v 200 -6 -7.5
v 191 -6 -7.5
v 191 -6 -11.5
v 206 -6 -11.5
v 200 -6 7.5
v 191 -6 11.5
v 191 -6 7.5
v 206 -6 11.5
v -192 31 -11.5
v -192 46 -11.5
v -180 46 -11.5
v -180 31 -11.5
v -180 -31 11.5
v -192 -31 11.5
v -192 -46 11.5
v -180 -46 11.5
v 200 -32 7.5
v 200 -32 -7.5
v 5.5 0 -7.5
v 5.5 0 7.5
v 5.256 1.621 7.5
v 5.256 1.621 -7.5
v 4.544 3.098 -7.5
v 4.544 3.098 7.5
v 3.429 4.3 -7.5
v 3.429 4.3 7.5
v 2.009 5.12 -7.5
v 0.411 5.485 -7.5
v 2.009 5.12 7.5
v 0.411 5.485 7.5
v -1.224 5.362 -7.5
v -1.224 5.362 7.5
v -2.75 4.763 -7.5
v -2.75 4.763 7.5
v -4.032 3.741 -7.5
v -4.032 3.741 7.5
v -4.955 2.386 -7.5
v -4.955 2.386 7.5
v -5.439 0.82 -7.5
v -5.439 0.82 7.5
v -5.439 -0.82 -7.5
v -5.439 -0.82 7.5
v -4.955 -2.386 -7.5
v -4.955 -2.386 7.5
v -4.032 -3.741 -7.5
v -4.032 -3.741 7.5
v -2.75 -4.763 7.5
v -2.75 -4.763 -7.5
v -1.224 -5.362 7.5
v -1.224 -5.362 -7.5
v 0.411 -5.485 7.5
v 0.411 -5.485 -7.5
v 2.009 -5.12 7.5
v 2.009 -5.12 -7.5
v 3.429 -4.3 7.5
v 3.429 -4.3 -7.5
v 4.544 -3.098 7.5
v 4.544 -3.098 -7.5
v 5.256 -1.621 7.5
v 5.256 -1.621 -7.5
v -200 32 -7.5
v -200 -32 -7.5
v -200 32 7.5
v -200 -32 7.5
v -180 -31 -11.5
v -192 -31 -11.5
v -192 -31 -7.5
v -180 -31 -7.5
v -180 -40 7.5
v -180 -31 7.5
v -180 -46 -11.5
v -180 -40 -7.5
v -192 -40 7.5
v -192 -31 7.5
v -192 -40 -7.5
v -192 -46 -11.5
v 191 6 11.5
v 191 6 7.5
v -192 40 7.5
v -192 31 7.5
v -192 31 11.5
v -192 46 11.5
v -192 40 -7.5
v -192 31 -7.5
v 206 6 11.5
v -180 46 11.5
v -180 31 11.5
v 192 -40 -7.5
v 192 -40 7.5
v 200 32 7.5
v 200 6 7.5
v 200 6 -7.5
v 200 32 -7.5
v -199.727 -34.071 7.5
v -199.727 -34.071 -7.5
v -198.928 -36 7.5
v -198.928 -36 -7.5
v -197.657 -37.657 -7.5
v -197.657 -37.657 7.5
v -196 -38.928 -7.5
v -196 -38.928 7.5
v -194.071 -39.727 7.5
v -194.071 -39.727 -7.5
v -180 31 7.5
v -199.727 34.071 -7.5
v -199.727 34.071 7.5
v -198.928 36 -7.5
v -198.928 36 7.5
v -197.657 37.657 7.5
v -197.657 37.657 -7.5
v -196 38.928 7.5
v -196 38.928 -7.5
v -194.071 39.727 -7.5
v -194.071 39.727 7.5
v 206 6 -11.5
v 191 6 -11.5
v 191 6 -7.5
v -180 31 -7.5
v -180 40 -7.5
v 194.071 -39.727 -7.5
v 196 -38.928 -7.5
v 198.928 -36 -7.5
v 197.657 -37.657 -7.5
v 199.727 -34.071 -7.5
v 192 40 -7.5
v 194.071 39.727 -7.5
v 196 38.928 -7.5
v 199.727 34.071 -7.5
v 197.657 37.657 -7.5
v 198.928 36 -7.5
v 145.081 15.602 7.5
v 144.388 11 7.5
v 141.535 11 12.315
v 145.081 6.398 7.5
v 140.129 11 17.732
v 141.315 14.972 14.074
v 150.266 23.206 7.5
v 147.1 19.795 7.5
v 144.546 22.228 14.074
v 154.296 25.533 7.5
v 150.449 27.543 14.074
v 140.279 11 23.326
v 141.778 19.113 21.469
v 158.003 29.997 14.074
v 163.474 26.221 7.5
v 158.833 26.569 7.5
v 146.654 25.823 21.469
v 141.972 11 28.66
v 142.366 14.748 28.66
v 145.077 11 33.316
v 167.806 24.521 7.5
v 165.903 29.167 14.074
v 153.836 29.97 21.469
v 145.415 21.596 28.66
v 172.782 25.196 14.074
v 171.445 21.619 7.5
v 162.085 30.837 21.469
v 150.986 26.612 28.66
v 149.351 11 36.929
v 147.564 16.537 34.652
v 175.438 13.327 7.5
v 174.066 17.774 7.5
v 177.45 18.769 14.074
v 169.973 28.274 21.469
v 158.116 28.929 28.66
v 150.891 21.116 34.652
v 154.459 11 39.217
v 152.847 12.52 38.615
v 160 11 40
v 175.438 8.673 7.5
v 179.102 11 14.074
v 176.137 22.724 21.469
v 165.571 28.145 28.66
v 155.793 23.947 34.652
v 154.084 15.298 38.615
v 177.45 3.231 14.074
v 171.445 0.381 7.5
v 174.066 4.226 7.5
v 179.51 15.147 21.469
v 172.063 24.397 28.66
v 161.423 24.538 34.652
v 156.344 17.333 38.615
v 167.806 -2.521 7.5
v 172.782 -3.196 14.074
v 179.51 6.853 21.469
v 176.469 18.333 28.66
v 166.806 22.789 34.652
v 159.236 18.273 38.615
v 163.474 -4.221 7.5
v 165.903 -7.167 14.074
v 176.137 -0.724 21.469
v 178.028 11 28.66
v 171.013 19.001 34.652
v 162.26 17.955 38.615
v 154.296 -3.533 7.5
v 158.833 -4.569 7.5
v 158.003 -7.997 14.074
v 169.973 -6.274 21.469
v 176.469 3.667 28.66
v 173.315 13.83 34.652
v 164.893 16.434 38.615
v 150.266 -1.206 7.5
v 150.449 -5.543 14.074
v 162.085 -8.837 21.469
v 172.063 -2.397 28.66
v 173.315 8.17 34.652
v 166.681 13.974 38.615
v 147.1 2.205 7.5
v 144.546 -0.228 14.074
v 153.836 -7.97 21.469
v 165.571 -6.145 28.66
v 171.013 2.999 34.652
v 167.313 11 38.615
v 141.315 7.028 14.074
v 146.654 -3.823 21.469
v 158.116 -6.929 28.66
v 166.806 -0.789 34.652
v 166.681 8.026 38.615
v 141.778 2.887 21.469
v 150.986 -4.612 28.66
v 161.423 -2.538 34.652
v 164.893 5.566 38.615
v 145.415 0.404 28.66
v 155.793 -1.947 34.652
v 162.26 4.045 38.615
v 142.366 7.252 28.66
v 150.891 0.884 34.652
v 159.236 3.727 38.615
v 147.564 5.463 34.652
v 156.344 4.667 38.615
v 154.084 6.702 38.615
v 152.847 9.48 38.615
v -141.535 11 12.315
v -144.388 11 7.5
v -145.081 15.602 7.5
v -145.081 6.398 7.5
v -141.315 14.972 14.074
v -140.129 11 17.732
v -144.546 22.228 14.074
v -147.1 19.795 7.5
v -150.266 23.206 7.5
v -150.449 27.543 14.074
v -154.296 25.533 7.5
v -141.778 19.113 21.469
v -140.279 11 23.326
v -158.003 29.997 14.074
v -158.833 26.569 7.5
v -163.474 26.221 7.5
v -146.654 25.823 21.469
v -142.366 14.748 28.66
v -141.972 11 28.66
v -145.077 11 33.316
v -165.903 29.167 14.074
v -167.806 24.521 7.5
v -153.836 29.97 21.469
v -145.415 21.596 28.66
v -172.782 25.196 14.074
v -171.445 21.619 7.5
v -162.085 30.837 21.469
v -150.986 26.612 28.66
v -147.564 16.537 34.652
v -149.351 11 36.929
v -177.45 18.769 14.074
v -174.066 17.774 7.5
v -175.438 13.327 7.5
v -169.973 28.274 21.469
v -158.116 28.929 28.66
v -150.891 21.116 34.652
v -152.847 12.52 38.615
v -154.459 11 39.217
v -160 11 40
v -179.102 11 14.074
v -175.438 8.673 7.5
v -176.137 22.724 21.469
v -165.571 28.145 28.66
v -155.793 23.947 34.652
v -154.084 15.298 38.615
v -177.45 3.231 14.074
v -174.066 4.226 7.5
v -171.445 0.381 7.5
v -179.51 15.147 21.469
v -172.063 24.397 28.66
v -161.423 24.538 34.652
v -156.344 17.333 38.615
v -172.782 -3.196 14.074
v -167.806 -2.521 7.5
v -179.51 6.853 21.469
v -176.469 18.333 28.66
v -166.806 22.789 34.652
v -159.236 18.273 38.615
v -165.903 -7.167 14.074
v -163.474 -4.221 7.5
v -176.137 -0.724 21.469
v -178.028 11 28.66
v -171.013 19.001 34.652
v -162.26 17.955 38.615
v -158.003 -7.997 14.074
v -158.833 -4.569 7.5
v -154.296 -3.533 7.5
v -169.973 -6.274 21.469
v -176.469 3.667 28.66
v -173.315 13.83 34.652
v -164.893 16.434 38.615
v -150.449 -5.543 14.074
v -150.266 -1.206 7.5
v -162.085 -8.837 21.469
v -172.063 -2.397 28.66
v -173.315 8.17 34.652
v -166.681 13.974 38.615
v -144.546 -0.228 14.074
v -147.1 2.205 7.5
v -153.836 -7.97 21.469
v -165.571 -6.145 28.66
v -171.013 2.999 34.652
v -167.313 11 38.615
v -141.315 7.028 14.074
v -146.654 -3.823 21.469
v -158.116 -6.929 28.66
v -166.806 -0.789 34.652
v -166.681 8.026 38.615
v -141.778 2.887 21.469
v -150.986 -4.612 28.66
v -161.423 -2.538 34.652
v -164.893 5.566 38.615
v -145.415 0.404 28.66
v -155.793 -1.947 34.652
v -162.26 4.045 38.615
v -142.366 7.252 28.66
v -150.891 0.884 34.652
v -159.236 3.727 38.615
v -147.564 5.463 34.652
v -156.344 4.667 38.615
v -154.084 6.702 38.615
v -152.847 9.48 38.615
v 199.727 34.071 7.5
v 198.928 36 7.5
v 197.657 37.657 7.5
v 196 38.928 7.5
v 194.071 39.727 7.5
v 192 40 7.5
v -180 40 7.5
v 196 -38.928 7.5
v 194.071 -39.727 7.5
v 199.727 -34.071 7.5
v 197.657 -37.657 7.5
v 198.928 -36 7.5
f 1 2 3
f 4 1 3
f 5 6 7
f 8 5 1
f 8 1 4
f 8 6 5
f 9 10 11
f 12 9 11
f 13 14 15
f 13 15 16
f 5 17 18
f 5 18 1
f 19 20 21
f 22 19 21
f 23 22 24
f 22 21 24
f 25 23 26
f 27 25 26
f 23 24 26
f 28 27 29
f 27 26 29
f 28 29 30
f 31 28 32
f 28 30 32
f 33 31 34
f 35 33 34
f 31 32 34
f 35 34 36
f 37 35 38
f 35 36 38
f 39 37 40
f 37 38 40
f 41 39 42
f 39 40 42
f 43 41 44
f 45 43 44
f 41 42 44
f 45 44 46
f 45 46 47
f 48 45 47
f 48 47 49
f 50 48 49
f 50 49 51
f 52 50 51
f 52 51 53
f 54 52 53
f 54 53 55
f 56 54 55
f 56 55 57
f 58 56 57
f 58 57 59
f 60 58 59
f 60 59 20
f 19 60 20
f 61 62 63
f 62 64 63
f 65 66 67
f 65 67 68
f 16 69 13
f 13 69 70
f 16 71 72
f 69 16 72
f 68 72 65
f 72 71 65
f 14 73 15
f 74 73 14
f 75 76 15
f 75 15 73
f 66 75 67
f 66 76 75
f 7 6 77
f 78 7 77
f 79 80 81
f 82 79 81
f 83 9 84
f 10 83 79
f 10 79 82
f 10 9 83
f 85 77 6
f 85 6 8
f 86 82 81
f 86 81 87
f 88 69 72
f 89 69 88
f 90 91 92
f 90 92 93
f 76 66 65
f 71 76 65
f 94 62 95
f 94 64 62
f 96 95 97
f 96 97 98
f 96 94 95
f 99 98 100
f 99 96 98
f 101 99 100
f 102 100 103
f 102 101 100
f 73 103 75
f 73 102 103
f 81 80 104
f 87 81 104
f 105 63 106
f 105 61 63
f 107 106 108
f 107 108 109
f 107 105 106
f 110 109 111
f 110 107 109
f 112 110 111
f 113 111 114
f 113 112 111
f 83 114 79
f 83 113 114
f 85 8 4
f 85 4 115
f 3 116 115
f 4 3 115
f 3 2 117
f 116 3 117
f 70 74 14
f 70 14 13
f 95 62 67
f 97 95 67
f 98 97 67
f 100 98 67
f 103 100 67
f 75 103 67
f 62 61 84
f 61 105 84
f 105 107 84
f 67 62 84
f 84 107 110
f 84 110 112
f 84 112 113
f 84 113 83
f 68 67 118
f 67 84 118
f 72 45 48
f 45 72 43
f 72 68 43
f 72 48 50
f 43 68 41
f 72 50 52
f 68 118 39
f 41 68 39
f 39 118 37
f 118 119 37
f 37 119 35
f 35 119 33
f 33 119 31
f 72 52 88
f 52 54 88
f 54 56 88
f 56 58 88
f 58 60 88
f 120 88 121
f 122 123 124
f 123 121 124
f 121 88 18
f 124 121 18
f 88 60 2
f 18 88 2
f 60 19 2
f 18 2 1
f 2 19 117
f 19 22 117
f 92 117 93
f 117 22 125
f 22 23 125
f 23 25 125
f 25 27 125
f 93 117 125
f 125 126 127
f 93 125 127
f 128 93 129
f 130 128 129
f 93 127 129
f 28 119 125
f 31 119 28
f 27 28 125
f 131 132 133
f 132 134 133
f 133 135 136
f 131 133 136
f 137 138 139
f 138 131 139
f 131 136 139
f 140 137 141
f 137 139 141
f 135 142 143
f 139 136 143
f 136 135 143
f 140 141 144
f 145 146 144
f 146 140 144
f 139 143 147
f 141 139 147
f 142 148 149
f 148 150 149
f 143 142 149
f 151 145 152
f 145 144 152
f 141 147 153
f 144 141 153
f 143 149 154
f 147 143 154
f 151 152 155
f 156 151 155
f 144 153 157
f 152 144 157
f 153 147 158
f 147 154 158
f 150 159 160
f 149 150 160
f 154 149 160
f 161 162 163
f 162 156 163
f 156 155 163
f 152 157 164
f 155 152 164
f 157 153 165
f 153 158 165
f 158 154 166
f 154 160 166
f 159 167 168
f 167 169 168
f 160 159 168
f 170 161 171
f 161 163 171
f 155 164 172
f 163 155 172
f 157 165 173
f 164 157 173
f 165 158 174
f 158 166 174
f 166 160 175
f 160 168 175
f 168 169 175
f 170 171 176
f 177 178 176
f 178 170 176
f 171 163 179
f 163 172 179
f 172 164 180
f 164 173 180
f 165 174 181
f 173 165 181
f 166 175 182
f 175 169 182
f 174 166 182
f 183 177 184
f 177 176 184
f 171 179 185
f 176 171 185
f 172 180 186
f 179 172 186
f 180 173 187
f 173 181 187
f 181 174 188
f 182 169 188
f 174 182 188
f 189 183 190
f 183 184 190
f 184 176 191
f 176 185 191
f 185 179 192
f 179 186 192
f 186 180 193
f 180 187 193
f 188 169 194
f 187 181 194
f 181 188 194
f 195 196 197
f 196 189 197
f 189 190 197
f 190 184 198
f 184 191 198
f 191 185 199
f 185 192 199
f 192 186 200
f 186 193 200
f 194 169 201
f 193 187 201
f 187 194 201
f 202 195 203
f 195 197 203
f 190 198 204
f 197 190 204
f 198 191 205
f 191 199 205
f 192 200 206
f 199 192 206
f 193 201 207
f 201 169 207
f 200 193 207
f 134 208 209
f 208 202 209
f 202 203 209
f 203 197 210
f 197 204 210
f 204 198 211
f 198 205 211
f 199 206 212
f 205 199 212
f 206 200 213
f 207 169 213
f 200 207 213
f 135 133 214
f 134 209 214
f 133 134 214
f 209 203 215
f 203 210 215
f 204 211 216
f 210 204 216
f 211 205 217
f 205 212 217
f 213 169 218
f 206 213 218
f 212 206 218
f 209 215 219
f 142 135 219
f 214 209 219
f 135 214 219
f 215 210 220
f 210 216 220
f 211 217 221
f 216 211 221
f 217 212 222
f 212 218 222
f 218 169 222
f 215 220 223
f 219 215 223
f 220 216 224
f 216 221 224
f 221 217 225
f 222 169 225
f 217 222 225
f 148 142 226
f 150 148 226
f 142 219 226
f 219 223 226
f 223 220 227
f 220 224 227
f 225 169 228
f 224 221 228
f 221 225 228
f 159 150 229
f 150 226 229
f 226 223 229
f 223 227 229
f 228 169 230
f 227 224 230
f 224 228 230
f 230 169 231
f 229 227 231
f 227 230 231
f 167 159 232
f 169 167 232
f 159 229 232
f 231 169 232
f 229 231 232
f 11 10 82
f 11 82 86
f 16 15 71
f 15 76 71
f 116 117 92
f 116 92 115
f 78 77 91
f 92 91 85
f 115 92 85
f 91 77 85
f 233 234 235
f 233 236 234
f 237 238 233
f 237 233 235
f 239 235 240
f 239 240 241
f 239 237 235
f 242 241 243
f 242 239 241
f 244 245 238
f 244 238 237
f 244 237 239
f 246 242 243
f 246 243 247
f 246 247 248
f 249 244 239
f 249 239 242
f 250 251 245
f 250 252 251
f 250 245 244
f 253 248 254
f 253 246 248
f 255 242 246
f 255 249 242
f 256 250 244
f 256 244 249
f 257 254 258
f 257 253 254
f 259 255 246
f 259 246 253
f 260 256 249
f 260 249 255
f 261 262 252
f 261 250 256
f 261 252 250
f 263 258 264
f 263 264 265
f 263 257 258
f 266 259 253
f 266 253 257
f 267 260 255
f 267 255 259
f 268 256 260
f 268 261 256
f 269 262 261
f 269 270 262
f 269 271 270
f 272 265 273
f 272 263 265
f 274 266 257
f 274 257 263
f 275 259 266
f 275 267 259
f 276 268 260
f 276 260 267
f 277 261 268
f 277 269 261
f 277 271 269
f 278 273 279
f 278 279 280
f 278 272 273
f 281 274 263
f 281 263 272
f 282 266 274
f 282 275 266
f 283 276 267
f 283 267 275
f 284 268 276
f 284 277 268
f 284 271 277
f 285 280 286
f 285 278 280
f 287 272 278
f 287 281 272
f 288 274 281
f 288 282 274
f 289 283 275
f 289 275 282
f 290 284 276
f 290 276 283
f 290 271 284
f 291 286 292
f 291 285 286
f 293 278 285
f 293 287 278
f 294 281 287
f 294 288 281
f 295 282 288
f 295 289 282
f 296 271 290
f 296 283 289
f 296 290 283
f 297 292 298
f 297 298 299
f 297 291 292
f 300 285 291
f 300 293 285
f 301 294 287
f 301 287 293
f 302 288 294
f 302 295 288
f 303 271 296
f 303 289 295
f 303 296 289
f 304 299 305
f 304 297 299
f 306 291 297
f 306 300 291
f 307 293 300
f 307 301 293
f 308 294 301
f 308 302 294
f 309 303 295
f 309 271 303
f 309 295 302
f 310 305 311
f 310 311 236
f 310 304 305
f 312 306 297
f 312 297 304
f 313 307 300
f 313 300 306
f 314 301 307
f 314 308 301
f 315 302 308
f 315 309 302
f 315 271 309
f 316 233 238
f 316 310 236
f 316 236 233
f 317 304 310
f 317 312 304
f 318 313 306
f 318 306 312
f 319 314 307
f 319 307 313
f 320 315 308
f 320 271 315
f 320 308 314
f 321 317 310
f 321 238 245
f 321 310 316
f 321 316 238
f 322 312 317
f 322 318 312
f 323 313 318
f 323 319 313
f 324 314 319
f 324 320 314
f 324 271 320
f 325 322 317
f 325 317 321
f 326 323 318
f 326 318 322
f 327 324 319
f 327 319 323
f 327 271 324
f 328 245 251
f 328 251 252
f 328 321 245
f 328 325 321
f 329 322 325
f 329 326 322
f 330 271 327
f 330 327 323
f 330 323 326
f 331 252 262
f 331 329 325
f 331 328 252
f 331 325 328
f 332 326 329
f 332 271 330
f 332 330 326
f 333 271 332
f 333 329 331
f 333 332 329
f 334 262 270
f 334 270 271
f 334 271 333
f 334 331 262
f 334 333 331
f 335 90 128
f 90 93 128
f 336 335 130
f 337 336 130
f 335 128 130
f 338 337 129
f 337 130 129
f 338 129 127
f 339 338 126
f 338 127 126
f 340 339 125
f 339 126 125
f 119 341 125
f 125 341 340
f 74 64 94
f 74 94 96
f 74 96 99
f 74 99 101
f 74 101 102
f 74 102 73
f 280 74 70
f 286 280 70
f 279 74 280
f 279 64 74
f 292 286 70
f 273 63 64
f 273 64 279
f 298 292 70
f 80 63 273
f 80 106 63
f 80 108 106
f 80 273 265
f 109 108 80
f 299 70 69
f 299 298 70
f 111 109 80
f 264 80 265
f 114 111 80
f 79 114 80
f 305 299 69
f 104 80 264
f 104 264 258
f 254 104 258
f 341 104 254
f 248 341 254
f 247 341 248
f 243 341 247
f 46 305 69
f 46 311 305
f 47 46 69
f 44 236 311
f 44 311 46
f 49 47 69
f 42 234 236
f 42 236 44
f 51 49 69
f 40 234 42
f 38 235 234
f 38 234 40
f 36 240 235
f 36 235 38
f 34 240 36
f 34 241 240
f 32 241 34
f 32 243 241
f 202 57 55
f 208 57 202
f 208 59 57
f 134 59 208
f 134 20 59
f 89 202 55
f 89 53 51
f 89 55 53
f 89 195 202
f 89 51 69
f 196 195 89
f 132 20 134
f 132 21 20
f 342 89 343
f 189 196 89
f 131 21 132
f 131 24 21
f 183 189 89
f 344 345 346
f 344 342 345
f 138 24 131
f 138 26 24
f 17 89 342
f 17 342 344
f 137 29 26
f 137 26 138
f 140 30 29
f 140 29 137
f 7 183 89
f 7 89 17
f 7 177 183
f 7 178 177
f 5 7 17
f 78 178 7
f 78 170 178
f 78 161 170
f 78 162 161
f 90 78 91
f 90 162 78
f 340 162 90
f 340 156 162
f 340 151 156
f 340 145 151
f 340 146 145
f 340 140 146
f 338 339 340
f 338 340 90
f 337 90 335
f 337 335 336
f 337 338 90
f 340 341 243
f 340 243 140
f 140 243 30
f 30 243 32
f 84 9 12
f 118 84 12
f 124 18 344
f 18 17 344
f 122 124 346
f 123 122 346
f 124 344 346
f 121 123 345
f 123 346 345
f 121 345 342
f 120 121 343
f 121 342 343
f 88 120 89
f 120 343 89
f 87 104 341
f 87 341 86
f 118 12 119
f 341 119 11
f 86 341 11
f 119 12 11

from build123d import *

# Parameters (mm, degrees)
F0_W     = 400
F0_H     = 80
F1_DEPTH = 7.5
F2_R     = 8
F3_W     = 12
F3_H     = 15
F3_W_2   = 15
F3_H_2   = 12
F4_DEPTH = 11.5
F5_R     = 5.5
F6_DEPTH = 25


# Not quite as in the source:
# - a pattern or mirror of a feature is missing from the dataset's text; its kind, count and spacing are read off the source's solid


with BuildPart() as f1:
    # F0 (on Top) → F1 (new body, symmetric)
    with BuildSketch(Plane.XY):
        Rectangle(F0_W, F0_H)
    extrude(amount=F1_DEPTH, both=True)

    # F2
    f2_edges = [f1.edges().sort_by_distance(p)[0] for p in [
        (-200, -40, 0),
        (200, -40, 0),
        (200, 40, 0),
        (-200, 40, 0),
    ]]
    fillet(f2_edges, radius=F2_R)

    # F3 (on Top) → F4 (join, symmetric)
    with BuildSketch(Plane.XY):
        with Locations((-186, -38.5)):
            Rectangle(F3_W, F3_H)
        with Locations((-186, 38.5)):
            Rectangle(F3_W, F3_H)
        with Locations((198.5, 0)):
            Rectangle(F3_W_2, F3_H_2)
    extrude(amount=F4_DEPTH, both=True)

    # F5 (on face) → F6 (cut)
    with BuildSketch(Plane.XY.offset(7.5)):
        Circle(F5_R)
    extrude(amount=-F6_DEPTH, mode=Mode.SUBTRACT)

    # F10 (on plane+point) → F11 (revolve)
    with BuildSketch(Plane.XZ.offset(-11)):
        with BuildLine():
            Line((-160, 40), (-160, 0))
            ThreePointArc((-160, 0), (-140, 20), (-160, 40))
        make_face()
    f11 = revolve(axis=Axis((-160, 11, 20), (0, 0, 1)))

    # F11_copies: F11 across plane
    add(f11.mirror(Plane(origin=(0, 0, 0), x_dir=(0, 0, 1), z_dir=(1, 0, 0))))


solid = f1.part
